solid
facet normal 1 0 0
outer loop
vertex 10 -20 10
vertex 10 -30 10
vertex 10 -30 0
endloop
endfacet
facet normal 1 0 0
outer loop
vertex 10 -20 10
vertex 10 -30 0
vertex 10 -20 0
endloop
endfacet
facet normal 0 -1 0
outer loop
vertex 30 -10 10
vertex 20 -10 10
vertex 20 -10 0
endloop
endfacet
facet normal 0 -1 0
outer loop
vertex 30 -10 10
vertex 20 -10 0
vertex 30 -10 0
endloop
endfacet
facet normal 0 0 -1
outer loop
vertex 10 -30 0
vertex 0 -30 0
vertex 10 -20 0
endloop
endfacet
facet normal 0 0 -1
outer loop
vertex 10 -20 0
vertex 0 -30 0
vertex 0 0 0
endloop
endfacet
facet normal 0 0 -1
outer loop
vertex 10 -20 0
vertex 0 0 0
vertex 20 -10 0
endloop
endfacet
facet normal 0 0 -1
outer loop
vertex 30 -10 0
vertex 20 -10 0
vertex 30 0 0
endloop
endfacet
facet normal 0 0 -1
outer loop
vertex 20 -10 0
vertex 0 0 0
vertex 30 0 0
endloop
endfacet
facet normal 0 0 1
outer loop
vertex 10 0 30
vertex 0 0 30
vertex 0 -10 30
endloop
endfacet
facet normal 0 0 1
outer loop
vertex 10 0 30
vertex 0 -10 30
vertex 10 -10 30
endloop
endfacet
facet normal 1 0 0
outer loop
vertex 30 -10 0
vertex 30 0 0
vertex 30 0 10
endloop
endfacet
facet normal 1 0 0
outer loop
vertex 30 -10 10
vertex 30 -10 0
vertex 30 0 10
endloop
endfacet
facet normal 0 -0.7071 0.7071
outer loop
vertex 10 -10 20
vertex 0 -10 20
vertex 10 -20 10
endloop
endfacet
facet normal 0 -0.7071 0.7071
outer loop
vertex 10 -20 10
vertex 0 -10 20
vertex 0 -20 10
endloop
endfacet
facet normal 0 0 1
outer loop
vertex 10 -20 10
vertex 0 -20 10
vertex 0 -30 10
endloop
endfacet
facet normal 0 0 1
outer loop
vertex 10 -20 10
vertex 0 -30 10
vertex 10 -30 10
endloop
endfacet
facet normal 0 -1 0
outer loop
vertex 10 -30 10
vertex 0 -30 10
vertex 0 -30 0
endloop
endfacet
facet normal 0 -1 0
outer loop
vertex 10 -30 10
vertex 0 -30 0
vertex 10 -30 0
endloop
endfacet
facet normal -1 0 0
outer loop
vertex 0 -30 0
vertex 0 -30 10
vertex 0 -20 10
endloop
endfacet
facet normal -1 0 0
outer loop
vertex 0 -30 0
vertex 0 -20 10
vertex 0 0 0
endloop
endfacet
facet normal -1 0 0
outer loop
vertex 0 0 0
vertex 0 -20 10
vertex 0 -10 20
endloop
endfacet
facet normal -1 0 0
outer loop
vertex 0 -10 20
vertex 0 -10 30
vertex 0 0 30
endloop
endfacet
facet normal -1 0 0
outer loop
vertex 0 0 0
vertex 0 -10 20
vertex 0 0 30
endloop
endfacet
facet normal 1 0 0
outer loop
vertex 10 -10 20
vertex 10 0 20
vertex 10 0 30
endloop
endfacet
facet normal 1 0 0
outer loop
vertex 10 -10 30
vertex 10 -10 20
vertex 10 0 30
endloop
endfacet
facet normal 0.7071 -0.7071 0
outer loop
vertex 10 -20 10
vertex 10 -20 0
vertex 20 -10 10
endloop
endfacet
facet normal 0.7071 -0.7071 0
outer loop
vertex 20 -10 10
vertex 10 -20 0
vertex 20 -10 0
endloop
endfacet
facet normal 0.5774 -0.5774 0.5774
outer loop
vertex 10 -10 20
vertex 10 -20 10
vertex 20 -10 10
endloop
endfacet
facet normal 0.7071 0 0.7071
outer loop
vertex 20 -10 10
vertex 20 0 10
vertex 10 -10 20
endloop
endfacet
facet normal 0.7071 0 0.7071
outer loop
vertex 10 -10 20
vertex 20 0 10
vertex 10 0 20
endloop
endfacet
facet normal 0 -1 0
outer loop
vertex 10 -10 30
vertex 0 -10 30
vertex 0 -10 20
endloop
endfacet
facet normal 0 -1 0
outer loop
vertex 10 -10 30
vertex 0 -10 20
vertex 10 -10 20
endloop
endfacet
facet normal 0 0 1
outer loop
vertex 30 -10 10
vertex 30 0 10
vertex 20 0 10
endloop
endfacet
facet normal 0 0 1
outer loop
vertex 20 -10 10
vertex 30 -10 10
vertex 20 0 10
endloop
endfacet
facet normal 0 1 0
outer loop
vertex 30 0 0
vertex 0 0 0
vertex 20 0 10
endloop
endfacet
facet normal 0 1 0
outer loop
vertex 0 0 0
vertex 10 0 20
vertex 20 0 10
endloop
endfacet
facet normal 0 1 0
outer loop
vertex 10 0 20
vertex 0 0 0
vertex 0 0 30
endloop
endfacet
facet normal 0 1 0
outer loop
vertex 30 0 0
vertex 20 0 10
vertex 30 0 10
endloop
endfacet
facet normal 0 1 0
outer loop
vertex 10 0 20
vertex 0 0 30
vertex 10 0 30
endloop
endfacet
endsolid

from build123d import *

# Parameters (mm, degrees)
F0_W     = 10
F0_H     = 10
F1_DEPTH = 30
F2_DEPTH = 10
F4_DEPTH = 10
F6_DEPTH = 10


with BuildPart() as f1:
    # F0 (on Front) → F1 (new body)
    with BuildSketch(Plane.XZ):
        with Locations((5, 5)):
            Rectangle(F0_W, F0_H)
    extrude(amount=F1_DEPTH)

    # F0 (on Front) → F2 (join)
    with BuildSketch(Plane.XZ):
        with Locations((5, 15)):
            Rectangle(F0_W, F0_H)
        with Locations((5, 25)):
            Rectangle(F0_W, F0_H)
        with Locations((15, 5)):
            Rectangle(F0_W, F0_H)
        with Locations((25, 5)):
            Rectangle(F0_W, F0_H)
        Polygon((10, 20), (10, 10), (20, 10), align=None)
    extrude(amount=F2_DEPTH)

    # F3 (on Right) → F4 (join)
    with BuildSketch(Plane.YZ):
        Polygon((-10, 10), (-10, 20), (-20, 10), align=None)
    extrude(amount=F4_DEPTH)

    # F5 (on Top) → F6 (join)
    with BuildSketch(Plane.XY):
        Polygon((10, -10), (10, -20), (20, -10), align=None)
    extrude(amount=F6_DEPTH)

    # F6_face (on face) → F7 section 0
    with BuildSketch(Plane(origin=(13.3333333333, -13.3333333333, 10), x_dir=(1, 0, 0), z_dir=(0, 0, 1)), mode=Mode.PRIVATE) as f7_s0:
        Polygon((-3.3333333333, 3.3333333333), (-3.3333333333, -6.6666666667), (6.6666666667, 3.3333333333), align=None)
    loft([f7_s0.sketch, Vertex(10, -10, 20)])


solid = f1.part
